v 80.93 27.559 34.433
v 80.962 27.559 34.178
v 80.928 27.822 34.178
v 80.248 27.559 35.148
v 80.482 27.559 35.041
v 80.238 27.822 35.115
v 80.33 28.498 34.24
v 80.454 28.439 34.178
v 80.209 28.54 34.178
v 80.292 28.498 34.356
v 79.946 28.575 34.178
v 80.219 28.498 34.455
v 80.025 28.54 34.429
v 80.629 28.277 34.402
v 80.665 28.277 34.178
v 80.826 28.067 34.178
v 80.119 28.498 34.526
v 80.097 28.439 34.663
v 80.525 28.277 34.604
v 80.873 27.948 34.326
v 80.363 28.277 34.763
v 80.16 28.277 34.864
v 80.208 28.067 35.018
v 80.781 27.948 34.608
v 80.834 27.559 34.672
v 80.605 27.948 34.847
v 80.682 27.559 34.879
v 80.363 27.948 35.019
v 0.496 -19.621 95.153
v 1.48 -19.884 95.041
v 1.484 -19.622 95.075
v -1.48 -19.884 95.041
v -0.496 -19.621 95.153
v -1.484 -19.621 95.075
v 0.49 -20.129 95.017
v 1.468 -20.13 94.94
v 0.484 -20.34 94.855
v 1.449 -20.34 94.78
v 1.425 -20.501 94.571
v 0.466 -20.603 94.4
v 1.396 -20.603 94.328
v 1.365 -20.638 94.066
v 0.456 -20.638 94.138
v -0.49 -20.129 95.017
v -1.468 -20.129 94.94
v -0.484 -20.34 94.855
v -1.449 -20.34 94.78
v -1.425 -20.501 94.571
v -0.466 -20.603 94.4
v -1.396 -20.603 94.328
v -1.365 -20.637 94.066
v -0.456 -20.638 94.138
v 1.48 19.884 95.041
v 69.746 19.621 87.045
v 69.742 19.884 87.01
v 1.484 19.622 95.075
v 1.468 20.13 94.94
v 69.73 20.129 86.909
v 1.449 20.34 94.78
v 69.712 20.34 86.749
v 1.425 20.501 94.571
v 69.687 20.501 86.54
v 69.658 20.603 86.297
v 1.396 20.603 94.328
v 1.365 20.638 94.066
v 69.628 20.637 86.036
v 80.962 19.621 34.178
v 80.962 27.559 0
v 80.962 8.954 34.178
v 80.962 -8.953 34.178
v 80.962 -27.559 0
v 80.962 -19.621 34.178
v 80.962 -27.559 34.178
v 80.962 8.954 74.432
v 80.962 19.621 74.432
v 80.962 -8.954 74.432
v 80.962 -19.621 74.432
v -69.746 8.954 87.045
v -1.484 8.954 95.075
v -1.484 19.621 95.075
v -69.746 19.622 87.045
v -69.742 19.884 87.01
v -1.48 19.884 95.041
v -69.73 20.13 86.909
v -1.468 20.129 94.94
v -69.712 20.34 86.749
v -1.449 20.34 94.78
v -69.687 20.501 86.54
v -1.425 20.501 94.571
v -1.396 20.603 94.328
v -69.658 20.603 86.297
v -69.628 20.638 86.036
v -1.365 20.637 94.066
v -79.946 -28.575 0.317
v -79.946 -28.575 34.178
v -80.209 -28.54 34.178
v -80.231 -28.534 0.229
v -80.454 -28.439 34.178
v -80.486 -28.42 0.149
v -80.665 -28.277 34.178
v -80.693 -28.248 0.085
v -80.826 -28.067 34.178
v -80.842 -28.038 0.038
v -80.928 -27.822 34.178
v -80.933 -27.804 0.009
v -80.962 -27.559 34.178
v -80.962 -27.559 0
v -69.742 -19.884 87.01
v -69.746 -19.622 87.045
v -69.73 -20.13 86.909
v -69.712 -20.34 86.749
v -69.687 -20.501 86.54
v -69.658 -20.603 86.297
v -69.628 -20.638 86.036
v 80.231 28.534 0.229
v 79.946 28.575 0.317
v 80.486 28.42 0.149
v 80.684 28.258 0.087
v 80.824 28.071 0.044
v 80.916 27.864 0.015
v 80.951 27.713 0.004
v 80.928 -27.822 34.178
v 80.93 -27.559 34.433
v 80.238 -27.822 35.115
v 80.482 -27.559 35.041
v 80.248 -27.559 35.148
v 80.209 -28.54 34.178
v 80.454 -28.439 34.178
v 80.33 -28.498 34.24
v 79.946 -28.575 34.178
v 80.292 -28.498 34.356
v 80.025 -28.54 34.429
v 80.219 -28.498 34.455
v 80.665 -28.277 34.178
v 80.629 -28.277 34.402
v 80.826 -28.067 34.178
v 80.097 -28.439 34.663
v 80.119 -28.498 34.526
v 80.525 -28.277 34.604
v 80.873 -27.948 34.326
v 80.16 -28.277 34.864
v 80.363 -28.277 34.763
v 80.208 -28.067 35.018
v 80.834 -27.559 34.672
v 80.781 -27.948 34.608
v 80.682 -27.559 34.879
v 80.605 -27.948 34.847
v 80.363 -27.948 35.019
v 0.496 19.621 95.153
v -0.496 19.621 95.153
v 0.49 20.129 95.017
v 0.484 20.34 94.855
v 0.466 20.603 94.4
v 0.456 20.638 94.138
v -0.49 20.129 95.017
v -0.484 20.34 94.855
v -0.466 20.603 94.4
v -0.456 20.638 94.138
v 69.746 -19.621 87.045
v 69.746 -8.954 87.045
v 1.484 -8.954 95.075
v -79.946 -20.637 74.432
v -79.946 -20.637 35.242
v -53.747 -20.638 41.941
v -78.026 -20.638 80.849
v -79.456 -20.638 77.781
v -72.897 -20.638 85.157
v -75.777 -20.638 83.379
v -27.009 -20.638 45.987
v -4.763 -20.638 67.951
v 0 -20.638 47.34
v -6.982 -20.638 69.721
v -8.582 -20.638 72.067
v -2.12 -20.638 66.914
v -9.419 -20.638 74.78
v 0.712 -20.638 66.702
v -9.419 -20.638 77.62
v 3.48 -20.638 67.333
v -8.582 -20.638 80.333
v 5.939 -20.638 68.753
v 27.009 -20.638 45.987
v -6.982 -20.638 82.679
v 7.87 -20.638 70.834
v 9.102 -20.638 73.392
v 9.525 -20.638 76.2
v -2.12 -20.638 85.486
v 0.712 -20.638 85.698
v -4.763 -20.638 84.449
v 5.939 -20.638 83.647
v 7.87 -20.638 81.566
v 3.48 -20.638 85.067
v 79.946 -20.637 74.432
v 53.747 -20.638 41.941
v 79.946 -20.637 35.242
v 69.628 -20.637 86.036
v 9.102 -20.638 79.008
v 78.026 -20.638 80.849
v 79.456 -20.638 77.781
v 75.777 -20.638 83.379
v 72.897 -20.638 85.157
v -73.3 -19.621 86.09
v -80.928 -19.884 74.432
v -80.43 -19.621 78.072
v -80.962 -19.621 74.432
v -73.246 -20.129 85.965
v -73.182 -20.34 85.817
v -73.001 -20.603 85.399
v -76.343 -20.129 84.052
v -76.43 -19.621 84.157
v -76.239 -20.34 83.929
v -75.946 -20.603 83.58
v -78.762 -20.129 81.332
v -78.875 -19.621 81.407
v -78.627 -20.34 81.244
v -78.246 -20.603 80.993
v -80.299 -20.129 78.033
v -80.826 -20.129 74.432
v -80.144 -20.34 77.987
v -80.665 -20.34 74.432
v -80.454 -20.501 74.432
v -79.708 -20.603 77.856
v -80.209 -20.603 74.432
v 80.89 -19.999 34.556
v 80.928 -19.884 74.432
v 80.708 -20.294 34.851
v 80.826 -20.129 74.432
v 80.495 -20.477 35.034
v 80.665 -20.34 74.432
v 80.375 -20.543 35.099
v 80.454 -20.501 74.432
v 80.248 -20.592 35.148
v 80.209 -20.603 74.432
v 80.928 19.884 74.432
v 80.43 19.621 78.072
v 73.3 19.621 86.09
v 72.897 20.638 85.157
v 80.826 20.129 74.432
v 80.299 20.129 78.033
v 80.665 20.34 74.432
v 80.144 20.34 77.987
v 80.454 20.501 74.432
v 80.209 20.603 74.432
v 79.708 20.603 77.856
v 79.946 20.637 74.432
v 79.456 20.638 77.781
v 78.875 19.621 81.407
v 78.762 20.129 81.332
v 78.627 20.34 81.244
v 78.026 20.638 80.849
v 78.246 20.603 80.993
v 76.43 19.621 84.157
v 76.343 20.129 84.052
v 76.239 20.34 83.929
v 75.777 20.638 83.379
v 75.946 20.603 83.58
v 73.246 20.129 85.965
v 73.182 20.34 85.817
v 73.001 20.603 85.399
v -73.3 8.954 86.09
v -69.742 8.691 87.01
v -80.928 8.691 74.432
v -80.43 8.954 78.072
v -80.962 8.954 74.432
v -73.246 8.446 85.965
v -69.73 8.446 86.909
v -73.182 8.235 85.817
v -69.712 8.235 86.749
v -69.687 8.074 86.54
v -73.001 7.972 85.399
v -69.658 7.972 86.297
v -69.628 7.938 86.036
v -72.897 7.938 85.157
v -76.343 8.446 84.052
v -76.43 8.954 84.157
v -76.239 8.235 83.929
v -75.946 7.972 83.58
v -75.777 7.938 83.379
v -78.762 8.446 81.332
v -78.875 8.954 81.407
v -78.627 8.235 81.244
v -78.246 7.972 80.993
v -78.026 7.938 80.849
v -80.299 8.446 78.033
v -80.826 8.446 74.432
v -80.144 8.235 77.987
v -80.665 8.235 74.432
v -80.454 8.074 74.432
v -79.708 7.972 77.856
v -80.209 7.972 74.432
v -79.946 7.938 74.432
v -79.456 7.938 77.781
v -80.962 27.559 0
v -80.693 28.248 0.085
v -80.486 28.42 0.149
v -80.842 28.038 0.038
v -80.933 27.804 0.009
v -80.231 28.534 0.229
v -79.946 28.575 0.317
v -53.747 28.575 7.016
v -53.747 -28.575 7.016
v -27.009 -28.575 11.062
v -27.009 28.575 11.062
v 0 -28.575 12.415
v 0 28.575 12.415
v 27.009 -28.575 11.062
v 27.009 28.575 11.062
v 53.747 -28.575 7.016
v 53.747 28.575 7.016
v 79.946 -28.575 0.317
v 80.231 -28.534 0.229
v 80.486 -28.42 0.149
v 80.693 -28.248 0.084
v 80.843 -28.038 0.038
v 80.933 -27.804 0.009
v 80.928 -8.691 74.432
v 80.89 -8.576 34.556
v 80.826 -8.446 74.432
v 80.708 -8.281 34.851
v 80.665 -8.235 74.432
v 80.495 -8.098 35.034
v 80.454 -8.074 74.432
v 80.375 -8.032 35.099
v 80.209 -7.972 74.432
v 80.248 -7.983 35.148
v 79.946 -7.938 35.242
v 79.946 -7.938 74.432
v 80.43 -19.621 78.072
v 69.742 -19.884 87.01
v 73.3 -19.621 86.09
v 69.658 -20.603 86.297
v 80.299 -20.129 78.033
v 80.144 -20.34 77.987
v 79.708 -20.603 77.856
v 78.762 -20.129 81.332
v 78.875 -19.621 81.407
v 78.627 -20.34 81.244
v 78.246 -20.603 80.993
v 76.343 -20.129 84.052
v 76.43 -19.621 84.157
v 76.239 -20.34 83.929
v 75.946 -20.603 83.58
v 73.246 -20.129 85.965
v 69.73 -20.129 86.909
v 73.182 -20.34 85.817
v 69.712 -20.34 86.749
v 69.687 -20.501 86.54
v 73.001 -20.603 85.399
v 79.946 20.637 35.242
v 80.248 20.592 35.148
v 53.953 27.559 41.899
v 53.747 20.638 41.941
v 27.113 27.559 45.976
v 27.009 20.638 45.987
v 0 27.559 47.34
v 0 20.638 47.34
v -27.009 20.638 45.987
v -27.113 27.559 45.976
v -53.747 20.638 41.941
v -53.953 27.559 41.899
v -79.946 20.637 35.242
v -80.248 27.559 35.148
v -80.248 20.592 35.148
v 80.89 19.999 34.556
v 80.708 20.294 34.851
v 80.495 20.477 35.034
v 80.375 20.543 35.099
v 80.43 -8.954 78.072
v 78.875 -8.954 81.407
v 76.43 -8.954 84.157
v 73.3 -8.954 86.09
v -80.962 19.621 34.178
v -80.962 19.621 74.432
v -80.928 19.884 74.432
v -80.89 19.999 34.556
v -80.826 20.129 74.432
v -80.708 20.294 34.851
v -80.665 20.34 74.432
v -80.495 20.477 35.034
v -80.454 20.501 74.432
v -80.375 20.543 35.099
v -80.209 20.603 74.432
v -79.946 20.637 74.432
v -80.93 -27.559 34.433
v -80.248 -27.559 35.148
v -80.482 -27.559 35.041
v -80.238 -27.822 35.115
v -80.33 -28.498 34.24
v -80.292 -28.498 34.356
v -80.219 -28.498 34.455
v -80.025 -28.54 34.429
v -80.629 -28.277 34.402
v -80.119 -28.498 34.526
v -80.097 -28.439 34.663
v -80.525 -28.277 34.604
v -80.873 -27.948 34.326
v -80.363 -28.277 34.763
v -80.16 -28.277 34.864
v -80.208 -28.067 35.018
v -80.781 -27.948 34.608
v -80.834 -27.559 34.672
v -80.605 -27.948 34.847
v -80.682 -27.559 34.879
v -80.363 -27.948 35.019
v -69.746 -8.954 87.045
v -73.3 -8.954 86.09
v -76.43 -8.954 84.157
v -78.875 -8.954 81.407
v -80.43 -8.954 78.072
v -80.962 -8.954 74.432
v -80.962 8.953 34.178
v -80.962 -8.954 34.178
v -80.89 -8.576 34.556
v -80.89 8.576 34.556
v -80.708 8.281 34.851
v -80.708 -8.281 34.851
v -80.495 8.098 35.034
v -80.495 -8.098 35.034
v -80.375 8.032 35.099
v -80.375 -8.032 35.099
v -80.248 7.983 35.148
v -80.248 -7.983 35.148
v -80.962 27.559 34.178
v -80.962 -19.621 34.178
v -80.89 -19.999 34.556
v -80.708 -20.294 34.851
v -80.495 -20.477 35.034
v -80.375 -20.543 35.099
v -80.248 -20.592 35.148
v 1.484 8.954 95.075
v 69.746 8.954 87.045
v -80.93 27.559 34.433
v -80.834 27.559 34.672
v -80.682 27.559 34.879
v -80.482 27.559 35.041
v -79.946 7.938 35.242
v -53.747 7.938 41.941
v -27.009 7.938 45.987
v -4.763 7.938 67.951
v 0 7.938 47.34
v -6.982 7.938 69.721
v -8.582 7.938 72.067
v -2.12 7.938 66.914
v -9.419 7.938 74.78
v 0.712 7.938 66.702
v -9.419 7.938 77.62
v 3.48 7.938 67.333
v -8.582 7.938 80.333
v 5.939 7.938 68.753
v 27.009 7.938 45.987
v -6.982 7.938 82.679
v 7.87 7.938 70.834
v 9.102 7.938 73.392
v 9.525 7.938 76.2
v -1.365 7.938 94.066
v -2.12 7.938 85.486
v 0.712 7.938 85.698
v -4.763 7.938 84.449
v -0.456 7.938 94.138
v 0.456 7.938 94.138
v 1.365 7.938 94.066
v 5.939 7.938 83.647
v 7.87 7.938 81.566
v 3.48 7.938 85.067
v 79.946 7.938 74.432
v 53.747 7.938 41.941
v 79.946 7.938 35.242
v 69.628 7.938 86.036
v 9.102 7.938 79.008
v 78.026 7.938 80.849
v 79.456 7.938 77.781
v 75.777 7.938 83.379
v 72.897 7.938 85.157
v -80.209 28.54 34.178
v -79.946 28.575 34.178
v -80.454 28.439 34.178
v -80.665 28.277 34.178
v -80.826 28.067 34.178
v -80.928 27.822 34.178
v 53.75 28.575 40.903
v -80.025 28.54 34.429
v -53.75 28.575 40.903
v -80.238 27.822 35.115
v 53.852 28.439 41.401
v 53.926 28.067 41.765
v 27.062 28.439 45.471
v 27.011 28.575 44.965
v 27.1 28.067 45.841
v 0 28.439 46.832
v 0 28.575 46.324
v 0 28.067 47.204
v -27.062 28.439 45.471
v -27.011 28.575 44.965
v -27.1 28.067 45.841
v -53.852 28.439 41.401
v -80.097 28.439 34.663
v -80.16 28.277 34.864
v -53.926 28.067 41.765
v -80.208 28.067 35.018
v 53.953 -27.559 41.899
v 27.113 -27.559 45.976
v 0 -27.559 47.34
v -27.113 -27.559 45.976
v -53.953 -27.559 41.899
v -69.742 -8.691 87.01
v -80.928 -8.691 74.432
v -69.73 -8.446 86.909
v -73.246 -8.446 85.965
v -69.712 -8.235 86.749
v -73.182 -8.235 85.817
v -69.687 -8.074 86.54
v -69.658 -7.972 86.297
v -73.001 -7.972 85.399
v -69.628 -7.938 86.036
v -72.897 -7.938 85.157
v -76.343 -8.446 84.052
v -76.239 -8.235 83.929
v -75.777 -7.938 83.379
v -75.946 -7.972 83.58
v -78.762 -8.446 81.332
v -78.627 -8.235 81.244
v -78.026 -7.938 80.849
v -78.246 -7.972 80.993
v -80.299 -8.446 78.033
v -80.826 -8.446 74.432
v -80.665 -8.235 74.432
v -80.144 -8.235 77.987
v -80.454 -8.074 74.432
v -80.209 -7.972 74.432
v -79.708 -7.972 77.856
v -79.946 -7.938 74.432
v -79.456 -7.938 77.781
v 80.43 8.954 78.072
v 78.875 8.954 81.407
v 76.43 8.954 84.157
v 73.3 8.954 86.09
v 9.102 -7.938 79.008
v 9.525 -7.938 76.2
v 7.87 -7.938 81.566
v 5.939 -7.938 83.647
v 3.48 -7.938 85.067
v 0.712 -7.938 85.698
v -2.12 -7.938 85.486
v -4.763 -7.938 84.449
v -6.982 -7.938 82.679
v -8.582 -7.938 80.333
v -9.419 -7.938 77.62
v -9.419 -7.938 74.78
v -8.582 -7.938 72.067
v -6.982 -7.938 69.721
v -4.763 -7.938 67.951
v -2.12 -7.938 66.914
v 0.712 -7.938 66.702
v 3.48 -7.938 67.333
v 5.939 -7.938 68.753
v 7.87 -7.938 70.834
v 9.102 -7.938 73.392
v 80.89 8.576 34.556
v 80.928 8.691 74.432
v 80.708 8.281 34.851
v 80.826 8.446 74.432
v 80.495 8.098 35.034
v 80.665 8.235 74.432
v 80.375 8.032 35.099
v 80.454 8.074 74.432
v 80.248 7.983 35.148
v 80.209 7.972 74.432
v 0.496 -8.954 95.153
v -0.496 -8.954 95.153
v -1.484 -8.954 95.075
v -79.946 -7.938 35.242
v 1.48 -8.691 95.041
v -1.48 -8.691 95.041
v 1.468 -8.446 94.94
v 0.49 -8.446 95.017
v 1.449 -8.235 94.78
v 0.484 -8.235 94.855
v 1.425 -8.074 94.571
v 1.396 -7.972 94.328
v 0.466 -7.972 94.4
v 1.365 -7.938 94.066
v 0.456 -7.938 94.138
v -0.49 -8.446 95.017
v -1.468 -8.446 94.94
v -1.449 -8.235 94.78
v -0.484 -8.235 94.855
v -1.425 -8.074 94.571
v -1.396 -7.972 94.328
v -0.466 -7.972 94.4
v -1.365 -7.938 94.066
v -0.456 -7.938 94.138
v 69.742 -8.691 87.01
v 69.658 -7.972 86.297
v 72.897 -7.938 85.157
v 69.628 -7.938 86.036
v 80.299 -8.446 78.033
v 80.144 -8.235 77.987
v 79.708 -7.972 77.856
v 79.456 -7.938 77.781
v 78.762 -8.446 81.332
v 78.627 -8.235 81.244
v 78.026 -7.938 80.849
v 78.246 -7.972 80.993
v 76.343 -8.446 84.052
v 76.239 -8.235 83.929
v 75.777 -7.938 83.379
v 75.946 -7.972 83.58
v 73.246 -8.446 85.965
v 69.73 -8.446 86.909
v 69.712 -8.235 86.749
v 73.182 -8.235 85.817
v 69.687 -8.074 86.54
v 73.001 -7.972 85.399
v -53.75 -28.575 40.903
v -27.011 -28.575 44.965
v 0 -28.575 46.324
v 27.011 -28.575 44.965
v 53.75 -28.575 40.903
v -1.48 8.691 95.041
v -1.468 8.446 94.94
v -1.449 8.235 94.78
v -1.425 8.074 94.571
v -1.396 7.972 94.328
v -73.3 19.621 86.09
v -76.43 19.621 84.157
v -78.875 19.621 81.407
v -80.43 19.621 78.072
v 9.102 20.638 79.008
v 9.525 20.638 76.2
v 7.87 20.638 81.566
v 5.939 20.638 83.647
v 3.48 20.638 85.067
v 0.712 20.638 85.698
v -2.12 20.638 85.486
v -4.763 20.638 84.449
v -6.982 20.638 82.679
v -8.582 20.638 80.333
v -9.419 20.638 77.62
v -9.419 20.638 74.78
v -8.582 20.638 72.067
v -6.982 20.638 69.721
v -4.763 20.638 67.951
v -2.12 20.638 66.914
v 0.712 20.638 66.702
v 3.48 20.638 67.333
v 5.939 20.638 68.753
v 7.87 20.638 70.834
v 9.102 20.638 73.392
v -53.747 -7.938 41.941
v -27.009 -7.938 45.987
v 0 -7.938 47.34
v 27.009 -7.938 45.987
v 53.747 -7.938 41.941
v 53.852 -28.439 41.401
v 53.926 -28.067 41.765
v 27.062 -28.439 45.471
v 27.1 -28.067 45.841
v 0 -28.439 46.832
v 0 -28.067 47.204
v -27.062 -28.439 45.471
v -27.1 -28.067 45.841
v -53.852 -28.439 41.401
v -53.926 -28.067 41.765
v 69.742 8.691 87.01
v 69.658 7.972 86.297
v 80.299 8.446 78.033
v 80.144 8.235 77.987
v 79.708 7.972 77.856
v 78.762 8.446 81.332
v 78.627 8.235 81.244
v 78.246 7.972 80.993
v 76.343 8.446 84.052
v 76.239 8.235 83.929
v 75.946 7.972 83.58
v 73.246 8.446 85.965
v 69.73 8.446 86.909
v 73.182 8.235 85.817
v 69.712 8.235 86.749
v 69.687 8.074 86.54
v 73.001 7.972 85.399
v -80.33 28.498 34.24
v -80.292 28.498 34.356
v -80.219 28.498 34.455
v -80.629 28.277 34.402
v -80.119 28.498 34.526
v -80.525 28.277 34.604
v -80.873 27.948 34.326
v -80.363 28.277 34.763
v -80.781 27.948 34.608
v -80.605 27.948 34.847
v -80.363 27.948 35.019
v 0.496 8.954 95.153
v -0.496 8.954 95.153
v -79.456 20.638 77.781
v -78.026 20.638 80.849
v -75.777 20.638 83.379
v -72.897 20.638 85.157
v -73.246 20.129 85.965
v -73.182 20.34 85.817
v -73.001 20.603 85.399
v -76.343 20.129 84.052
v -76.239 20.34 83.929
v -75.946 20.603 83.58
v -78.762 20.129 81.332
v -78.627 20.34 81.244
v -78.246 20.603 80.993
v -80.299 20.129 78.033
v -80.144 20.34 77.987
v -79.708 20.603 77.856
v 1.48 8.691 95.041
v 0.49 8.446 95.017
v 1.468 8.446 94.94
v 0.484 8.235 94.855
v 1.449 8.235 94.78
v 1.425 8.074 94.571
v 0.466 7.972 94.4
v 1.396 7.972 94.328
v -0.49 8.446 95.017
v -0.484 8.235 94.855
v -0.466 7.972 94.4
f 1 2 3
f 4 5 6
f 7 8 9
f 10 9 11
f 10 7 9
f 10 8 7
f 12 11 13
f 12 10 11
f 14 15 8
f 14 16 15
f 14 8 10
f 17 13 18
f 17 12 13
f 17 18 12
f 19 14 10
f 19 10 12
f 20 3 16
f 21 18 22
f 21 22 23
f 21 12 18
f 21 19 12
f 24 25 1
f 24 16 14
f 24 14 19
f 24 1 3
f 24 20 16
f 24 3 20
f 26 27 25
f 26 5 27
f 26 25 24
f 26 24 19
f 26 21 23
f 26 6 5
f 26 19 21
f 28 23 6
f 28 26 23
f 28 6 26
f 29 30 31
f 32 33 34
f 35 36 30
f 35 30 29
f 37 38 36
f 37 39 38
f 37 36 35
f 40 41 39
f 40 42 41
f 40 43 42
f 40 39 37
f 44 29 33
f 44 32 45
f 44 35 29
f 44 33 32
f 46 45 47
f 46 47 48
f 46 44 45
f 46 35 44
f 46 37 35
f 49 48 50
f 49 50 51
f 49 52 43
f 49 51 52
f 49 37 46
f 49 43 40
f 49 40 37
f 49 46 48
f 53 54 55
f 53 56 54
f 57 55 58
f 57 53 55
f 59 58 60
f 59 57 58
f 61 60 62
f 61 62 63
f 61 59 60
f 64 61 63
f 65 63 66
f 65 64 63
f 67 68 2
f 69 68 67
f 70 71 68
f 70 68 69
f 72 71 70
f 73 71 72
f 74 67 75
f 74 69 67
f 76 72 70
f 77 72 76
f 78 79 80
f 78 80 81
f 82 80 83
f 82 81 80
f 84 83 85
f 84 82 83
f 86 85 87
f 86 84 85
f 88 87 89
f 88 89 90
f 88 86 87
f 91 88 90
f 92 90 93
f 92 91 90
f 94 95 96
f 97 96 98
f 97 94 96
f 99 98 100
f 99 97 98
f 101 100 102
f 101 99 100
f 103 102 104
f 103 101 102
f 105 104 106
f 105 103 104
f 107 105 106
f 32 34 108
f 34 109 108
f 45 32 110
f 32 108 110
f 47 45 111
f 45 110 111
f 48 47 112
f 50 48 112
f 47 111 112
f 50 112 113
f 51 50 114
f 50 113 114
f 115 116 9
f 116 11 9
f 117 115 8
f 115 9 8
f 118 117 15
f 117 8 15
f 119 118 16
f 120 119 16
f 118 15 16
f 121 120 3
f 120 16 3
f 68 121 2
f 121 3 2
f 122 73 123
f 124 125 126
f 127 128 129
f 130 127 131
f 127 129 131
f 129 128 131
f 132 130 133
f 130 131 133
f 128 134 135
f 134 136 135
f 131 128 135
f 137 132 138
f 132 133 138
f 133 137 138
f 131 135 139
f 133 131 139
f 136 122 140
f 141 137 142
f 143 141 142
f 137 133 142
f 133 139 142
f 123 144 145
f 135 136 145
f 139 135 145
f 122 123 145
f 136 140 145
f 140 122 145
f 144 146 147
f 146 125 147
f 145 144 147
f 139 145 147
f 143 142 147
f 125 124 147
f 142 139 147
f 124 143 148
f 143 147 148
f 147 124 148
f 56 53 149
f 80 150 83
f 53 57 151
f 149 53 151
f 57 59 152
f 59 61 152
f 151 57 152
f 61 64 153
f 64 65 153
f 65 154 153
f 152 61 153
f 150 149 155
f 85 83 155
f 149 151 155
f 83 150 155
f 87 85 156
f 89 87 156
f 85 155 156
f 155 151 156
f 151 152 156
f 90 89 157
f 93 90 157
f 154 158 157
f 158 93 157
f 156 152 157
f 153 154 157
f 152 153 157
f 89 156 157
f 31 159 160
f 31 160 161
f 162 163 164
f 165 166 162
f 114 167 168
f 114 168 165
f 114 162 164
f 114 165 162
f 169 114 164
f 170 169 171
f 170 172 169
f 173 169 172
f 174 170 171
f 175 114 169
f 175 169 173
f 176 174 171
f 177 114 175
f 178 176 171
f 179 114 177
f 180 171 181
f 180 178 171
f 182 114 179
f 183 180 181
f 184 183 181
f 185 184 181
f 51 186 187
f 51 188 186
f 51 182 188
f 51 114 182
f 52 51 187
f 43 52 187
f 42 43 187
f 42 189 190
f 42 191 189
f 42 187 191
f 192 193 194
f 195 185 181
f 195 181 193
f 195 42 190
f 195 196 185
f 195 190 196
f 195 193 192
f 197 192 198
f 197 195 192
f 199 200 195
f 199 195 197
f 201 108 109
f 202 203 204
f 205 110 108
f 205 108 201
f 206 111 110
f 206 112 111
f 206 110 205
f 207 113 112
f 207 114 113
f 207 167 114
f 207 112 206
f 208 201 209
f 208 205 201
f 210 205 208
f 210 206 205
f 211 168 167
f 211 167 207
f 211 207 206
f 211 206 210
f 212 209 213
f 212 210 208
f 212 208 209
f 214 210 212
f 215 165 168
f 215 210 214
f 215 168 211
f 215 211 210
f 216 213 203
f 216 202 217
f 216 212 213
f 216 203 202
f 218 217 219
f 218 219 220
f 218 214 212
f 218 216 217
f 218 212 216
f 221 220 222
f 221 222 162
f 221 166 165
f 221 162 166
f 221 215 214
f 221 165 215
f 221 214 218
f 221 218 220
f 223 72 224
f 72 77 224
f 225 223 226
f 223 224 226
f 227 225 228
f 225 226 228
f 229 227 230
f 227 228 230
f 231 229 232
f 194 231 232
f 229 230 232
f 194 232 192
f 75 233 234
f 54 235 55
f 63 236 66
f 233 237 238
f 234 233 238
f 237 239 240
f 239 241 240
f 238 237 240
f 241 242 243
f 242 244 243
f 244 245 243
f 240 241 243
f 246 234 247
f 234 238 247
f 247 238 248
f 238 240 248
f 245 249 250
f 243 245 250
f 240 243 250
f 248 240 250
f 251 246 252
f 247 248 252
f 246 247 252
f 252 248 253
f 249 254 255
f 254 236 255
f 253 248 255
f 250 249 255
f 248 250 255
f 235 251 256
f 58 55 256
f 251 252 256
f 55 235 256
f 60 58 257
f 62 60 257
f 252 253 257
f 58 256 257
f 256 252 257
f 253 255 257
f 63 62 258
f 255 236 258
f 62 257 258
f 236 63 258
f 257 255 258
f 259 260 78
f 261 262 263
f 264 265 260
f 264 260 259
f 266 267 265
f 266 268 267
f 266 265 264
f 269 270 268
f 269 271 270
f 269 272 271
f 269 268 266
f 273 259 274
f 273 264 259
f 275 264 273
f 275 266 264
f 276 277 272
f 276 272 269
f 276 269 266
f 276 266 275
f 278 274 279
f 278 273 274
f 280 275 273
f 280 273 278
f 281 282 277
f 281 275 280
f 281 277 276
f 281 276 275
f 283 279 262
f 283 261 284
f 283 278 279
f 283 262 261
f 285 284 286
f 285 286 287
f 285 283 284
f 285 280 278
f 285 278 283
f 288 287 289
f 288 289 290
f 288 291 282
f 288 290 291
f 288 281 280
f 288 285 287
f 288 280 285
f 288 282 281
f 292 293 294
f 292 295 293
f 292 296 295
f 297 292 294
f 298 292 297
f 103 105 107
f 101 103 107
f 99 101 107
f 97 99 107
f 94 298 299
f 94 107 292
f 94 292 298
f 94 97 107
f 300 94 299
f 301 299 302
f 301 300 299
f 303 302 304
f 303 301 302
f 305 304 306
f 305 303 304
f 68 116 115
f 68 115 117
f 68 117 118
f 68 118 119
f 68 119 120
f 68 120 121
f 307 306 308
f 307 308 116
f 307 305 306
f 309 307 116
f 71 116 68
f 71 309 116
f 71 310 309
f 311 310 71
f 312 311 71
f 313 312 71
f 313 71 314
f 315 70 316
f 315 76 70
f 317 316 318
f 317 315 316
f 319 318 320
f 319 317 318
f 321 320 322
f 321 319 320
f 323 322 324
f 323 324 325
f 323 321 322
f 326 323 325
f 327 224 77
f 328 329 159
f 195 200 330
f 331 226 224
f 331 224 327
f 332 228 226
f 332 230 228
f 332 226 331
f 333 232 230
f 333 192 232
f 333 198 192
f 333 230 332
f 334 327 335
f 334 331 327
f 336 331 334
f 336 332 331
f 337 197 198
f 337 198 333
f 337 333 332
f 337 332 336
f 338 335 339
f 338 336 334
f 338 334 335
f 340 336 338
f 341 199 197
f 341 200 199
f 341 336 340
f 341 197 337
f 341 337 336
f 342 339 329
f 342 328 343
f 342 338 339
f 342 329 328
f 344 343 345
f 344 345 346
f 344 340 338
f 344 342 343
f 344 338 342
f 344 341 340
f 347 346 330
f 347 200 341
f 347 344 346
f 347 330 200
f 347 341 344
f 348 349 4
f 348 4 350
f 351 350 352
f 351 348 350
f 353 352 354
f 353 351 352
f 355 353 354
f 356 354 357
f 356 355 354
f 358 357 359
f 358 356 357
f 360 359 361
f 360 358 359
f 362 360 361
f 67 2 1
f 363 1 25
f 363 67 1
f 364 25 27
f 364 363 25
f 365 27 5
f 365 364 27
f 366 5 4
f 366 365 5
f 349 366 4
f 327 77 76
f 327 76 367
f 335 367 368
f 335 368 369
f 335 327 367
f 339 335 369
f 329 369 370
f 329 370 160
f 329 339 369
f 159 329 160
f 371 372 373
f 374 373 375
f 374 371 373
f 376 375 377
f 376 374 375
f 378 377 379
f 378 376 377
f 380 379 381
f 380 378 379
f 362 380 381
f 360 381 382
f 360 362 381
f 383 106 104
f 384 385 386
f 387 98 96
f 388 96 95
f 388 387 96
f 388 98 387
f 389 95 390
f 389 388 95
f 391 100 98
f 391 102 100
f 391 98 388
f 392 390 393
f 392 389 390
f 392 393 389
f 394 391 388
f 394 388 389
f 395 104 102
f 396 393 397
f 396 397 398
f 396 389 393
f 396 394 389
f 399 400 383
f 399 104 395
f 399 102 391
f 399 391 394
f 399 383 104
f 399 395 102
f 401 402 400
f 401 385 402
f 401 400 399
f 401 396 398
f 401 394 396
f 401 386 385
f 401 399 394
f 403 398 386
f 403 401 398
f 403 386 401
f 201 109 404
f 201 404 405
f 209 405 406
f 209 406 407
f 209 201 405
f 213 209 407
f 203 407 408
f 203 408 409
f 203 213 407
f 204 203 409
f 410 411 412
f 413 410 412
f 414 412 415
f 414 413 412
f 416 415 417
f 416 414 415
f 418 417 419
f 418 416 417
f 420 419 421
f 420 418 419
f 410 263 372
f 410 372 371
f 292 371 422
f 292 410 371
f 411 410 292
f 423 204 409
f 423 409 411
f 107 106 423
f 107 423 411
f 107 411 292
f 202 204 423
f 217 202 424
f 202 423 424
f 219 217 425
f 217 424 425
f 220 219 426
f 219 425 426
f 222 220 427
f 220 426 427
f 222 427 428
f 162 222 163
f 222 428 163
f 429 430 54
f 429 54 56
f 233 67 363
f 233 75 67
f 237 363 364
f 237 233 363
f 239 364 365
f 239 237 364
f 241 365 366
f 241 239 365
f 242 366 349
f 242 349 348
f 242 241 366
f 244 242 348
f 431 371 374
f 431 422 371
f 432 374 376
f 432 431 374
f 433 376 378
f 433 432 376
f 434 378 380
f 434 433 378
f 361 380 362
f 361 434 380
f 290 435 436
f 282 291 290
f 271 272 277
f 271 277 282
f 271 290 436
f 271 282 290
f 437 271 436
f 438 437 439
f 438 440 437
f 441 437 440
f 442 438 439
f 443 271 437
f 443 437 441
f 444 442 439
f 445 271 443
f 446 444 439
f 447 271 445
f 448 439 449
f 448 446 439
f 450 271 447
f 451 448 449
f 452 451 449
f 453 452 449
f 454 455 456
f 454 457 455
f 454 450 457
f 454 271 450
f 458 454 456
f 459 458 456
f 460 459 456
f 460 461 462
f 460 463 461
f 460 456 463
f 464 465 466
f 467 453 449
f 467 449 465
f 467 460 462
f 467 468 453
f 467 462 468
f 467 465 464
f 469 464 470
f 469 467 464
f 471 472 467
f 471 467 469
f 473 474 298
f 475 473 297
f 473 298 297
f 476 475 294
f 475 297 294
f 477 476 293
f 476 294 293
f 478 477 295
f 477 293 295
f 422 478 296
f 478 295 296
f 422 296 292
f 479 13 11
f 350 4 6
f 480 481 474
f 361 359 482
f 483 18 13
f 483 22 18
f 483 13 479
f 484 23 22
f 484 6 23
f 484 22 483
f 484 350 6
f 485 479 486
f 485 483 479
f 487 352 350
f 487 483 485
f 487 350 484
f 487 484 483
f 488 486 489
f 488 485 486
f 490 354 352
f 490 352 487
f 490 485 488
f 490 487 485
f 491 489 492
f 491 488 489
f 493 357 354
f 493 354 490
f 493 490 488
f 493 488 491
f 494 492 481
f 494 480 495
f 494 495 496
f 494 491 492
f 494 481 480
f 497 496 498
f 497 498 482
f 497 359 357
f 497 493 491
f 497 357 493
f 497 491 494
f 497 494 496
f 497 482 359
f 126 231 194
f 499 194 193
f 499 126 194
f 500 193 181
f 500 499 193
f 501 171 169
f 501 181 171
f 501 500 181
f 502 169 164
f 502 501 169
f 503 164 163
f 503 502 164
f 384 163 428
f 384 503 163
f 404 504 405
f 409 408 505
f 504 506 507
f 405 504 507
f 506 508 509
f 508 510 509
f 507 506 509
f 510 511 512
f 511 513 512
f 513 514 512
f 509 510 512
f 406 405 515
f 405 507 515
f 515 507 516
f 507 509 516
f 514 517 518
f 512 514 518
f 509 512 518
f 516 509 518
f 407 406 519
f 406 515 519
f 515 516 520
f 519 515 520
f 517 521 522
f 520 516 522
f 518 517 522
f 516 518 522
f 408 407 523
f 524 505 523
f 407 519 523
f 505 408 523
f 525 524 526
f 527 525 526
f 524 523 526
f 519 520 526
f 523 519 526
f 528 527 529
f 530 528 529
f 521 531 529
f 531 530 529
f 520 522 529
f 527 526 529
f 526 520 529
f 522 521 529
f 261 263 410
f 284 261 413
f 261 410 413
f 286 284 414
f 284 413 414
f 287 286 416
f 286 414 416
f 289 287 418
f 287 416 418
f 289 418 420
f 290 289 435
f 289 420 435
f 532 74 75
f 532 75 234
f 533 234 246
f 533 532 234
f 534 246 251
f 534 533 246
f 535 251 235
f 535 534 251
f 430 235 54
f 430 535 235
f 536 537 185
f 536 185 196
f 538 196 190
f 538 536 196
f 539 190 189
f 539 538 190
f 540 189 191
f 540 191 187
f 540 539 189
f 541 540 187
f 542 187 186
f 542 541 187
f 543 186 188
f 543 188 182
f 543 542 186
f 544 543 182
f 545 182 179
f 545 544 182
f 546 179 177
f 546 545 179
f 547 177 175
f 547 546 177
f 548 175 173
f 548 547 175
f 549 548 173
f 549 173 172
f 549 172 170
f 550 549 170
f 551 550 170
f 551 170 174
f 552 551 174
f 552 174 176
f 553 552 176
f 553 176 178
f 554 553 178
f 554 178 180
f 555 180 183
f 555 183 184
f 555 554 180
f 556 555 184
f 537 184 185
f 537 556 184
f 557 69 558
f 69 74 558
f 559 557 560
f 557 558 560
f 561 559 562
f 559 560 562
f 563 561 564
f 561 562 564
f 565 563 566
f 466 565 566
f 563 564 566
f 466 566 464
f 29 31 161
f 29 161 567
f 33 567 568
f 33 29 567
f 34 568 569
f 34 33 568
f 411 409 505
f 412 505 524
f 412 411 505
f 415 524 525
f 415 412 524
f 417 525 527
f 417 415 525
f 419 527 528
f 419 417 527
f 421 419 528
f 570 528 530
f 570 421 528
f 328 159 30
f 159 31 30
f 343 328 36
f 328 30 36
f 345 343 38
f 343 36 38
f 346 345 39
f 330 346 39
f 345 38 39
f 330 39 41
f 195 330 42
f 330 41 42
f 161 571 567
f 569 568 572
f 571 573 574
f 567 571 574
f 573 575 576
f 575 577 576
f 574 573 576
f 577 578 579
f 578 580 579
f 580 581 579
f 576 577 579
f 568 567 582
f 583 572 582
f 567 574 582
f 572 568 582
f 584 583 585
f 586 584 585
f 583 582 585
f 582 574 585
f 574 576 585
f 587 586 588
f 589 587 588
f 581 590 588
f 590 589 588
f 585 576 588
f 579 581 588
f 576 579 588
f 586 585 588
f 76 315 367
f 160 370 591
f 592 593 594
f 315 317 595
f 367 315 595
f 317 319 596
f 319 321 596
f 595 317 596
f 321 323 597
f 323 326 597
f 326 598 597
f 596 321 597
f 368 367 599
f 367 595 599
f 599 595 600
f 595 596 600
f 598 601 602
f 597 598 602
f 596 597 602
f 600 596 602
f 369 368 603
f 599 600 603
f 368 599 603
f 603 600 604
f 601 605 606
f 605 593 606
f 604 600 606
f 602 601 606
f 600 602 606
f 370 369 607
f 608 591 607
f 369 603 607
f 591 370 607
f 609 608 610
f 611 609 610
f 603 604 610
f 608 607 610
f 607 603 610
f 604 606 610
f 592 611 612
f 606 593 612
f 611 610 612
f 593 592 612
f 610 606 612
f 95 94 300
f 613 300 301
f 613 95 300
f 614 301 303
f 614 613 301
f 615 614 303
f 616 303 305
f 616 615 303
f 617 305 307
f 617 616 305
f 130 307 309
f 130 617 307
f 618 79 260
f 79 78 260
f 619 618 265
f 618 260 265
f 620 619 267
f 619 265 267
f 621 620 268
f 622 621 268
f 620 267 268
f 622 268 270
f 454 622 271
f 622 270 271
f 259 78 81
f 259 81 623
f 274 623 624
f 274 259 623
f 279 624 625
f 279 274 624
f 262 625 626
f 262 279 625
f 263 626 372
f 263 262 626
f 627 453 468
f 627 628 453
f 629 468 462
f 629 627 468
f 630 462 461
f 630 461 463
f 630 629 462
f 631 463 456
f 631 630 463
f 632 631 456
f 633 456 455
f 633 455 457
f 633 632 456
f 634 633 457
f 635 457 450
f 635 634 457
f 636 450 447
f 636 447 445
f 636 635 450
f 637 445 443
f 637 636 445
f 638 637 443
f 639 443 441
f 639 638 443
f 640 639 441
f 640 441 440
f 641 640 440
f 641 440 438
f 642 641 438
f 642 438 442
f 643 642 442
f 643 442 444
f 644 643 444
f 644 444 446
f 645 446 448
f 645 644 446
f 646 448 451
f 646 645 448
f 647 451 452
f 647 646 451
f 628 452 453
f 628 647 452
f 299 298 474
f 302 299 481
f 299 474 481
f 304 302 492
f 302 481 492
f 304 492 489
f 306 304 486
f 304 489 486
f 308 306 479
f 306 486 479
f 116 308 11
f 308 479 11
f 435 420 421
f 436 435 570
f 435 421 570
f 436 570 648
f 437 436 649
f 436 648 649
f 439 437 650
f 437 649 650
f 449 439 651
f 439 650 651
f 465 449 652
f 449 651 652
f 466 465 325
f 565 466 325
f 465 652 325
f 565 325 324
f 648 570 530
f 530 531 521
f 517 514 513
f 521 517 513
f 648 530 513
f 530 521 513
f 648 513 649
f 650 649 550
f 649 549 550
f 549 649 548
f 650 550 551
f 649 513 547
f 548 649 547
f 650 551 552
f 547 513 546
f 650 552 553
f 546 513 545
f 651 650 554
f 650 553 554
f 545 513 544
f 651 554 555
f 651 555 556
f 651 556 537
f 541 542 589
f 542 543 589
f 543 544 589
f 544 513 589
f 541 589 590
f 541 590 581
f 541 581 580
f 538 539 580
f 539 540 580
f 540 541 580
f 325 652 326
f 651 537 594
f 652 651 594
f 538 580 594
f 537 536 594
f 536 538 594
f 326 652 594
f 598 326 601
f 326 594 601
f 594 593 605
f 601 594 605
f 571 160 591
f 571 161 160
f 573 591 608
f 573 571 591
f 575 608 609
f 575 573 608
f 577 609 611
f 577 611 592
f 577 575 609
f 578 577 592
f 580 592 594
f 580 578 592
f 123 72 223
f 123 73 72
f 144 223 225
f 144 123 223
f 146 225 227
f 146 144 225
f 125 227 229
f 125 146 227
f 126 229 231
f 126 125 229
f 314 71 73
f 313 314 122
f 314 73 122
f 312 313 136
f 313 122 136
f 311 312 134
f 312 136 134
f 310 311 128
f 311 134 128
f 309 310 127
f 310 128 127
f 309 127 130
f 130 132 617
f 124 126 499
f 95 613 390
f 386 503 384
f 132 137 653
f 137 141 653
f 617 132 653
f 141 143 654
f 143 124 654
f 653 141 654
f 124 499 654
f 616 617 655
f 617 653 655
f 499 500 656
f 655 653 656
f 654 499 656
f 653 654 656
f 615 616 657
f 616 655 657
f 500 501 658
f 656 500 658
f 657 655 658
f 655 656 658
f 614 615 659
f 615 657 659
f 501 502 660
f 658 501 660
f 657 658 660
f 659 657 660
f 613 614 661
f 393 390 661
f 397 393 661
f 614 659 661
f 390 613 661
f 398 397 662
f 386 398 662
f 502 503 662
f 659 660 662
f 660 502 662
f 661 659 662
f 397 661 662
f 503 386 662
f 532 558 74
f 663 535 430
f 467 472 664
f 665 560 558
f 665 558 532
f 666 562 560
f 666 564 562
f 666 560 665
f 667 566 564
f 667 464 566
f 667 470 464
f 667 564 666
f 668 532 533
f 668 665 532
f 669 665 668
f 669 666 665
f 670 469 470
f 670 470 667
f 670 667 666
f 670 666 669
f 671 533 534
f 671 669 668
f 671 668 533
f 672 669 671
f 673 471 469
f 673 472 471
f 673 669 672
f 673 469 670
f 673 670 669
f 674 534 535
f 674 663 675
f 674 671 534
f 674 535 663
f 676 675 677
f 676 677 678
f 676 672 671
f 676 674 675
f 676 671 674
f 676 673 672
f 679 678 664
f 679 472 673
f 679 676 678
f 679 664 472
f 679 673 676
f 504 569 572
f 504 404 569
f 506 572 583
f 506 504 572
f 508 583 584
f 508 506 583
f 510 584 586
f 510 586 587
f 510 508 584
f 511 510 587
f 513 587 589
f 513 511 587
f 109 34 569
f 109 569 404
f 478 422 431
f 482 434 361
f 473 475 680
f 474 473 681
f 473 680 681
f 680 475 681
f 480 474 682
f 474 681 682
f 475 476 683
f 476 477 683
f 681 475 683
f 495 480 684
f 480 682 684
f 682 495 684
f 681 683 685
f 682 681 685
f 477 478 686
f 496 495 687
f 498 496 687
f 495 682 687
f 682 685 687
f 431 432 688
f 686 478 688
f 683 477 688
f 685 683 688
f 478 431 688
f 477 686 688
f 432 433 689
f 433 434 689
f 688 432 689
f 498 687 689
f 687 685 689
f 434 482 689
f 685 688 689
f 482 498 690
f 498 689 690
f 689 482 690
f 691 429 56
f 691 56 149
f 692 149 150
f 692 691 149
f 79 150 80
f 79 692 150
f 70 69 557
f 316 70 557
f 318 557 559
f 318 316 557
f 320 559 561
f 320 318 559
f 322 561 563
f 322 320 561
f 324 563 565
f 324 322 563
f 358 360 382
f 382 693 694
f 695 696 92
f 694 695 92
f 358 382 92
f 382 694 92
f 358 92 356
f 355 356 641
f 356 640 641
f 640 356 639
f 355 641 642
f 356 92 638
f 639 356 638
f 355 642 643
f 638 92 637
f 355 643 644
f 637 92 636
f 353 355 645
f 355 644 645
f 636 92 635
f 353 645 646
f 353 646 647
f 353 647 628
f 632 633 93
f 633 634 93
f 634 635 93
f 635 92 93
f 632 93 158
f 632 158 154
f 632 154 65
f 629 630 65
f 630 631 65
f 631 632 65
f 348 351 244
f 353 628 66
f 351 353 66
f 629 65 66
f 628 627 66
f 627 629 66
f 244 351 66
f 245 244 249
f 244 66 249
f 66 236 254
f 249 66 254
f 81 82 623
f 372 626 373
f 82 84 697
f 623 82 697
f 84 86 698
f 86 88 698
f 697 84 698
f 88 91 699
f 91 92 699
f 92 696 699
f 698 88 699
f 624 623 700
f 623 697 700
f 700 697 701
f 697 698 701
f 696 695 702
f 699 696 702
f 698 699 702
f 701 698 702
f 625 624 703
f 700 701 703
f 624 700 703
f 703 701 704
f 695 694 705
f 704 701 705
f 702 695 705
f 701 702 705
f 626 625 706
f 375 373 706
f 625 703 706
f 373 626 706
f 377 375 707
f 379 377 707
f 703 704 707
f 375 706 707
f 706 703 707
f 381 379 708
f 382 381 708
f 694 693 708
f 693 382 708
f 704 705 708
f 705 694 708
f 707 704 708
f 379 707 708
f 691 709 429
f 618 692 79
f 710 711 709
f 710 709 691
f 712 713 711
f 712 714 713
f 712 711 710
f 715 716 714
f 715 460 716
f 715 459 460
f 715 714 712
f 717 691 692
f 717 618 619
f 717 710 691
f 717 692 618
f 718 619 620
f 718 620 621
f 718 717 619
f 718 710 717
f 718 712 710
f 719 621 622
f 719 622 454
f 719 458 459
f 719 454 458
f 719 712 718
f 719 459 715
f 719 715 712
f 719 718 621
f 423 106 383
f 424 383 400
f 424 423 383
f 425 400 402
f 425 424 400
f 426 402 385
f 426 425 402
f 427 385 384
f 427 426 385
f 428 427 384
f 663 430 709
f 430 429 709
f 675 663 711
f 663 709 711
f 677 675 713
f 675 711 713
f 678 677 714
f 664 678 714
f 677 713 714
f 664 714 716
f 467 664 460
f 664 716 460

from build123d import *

# Parameters (mm, degrees)
F1_DEPTH = 28.575
F0_R     = 9.525
F2_DEPTH = 20.6375
F3_DEPTH = 7.9375
F7_R     = 1.016


with BuildPart() as f1:
    # F0 (on Front) → F1 (new body, symmetric)
    with BuildSketch(Plane.XZ):
        with BuildLine():
            ThreePointArc((-80.9625, 0), (0, 12.4151634214), (80.9625, 0))
            Line((80.9625, 0), (80.9625, 34.925))
            ThreePointArc((80.9625, 34.925), (0, 47.3401634214), (-80.9625, 34.925))
            Line((-80.9625, 34.925), (-80.9625, 0))
        make_face()
    extrude(amount=F1_DEPTH, both=True)

    # F0 (on Front) → F2 (join, symmetric)
    with BuildSketch(Plane.XZ):
        with BuildLine():
            ThreePointArc((-80.9625, 34.925), (0, 47.3401634214), (80.9625, 34.925))
            Line((80.9625, 34.925), (80.9625, 74.4315304023))
            ThreePointArc((80.9625, 74.4315304023), (77.7528984326, 82.8708631715), (69.7463838441, 87.0445430772))
            Line((69.7463838441, 87.0445430772), (1.4838838441, 95.0754254301))
            ThreePointArc((1.4838838441, 95.0754254301), (0, 95.1624127552), (-1.4838838441, 95.0754254301))
            Line((-1.4838838441, 95.0754254301), (-69.7463838441, 87.0445430772))
            ThreePointArc((-69.7463838441, 87.0445430772), (-77.7528984326, 82.8708631715), (-80.9625, 74.4315304023))
            Line((-80.9625, 74.4315304023), (-80.9625, 34.925))
        make_face()
        with Locations((0, 76.2)):
            Circle(F0_R, mode=Mode.SUBTRACT)
    extrude(amount=F2_DEPTH, both=True)

    # F0 (on Front) → F3 (cut, symmetric)
    with BuildSketch(Plane.XZ):
        with BuildLine():
            ThreePointArc((-80.9625, 34.925), (0, 47.3401634214), (80.9625, 34.925))
            Line((80.9625, 34.925), (80.9625, 74.4315304023))
            ThreePointArc((80.9625, 74.4315304023), (77.7528984326, 82.8708631715), (69.7463838441, 87.0445430772))
            Line((69.7463838441, 87.0445430772), (1.4838838441, 95.0754254301))
            ThreePointArc((1.4838838441, 95.0754254301), (0, 95.1624127552), (-1.4838838441, 95.0754254301))
            Line((-1.4838838441, 95.0754254301), (-69.7463838441, 87.0445430772))
            ThreePointArc((-69.7463838441, 87.0445430772), (-77.7528984326, 82.8708631715), (-80.9625, 74.4315304023))
            Line((-80.9625, 74.4315304023), (-80.9625, 34.925))
        make_face()
        with Locations((0, 76.2)):
            Circle(F0_R, mode=Mode.SUBTRACT)
    extrude(amount=F3_DEPTH, both=True, mode=Mode.SUBTRACT)

    # F7
    f7_edges = [f1.edges().sort_by_distance(p)[0] for p in [
        (80.9625, 24.60625, 34.925),
        (80.9625, -24.60625, 34.925),
        (-80.9625, 24.60625, 34.925),
        (-80.9625, -24.60625, 34.925),
        (-80.9625, 0, 34.925),
        (80.9625, 0, 34.925),
        (80.9625, 28.575, 17.4625),
        (80.9625, -28.575, 17.4625),
        (-80.9625, 28.575, 17.4625),
        (-80.9625, -28.575, 17.4625),
        (0, -28.575, 47.340163),
        (0, 28.575, 47.340163),
        (-80.9625, -20.6375, 54.678265),
        (-80.9625, -7.9375, 54.678265),
        (80.9625, 20.6375, 54.678265),
        (80.9625, 7.9375, 54.678265),
    ]]
    fillet(f7_edges, radius=F7_R)


solid = f1.part
